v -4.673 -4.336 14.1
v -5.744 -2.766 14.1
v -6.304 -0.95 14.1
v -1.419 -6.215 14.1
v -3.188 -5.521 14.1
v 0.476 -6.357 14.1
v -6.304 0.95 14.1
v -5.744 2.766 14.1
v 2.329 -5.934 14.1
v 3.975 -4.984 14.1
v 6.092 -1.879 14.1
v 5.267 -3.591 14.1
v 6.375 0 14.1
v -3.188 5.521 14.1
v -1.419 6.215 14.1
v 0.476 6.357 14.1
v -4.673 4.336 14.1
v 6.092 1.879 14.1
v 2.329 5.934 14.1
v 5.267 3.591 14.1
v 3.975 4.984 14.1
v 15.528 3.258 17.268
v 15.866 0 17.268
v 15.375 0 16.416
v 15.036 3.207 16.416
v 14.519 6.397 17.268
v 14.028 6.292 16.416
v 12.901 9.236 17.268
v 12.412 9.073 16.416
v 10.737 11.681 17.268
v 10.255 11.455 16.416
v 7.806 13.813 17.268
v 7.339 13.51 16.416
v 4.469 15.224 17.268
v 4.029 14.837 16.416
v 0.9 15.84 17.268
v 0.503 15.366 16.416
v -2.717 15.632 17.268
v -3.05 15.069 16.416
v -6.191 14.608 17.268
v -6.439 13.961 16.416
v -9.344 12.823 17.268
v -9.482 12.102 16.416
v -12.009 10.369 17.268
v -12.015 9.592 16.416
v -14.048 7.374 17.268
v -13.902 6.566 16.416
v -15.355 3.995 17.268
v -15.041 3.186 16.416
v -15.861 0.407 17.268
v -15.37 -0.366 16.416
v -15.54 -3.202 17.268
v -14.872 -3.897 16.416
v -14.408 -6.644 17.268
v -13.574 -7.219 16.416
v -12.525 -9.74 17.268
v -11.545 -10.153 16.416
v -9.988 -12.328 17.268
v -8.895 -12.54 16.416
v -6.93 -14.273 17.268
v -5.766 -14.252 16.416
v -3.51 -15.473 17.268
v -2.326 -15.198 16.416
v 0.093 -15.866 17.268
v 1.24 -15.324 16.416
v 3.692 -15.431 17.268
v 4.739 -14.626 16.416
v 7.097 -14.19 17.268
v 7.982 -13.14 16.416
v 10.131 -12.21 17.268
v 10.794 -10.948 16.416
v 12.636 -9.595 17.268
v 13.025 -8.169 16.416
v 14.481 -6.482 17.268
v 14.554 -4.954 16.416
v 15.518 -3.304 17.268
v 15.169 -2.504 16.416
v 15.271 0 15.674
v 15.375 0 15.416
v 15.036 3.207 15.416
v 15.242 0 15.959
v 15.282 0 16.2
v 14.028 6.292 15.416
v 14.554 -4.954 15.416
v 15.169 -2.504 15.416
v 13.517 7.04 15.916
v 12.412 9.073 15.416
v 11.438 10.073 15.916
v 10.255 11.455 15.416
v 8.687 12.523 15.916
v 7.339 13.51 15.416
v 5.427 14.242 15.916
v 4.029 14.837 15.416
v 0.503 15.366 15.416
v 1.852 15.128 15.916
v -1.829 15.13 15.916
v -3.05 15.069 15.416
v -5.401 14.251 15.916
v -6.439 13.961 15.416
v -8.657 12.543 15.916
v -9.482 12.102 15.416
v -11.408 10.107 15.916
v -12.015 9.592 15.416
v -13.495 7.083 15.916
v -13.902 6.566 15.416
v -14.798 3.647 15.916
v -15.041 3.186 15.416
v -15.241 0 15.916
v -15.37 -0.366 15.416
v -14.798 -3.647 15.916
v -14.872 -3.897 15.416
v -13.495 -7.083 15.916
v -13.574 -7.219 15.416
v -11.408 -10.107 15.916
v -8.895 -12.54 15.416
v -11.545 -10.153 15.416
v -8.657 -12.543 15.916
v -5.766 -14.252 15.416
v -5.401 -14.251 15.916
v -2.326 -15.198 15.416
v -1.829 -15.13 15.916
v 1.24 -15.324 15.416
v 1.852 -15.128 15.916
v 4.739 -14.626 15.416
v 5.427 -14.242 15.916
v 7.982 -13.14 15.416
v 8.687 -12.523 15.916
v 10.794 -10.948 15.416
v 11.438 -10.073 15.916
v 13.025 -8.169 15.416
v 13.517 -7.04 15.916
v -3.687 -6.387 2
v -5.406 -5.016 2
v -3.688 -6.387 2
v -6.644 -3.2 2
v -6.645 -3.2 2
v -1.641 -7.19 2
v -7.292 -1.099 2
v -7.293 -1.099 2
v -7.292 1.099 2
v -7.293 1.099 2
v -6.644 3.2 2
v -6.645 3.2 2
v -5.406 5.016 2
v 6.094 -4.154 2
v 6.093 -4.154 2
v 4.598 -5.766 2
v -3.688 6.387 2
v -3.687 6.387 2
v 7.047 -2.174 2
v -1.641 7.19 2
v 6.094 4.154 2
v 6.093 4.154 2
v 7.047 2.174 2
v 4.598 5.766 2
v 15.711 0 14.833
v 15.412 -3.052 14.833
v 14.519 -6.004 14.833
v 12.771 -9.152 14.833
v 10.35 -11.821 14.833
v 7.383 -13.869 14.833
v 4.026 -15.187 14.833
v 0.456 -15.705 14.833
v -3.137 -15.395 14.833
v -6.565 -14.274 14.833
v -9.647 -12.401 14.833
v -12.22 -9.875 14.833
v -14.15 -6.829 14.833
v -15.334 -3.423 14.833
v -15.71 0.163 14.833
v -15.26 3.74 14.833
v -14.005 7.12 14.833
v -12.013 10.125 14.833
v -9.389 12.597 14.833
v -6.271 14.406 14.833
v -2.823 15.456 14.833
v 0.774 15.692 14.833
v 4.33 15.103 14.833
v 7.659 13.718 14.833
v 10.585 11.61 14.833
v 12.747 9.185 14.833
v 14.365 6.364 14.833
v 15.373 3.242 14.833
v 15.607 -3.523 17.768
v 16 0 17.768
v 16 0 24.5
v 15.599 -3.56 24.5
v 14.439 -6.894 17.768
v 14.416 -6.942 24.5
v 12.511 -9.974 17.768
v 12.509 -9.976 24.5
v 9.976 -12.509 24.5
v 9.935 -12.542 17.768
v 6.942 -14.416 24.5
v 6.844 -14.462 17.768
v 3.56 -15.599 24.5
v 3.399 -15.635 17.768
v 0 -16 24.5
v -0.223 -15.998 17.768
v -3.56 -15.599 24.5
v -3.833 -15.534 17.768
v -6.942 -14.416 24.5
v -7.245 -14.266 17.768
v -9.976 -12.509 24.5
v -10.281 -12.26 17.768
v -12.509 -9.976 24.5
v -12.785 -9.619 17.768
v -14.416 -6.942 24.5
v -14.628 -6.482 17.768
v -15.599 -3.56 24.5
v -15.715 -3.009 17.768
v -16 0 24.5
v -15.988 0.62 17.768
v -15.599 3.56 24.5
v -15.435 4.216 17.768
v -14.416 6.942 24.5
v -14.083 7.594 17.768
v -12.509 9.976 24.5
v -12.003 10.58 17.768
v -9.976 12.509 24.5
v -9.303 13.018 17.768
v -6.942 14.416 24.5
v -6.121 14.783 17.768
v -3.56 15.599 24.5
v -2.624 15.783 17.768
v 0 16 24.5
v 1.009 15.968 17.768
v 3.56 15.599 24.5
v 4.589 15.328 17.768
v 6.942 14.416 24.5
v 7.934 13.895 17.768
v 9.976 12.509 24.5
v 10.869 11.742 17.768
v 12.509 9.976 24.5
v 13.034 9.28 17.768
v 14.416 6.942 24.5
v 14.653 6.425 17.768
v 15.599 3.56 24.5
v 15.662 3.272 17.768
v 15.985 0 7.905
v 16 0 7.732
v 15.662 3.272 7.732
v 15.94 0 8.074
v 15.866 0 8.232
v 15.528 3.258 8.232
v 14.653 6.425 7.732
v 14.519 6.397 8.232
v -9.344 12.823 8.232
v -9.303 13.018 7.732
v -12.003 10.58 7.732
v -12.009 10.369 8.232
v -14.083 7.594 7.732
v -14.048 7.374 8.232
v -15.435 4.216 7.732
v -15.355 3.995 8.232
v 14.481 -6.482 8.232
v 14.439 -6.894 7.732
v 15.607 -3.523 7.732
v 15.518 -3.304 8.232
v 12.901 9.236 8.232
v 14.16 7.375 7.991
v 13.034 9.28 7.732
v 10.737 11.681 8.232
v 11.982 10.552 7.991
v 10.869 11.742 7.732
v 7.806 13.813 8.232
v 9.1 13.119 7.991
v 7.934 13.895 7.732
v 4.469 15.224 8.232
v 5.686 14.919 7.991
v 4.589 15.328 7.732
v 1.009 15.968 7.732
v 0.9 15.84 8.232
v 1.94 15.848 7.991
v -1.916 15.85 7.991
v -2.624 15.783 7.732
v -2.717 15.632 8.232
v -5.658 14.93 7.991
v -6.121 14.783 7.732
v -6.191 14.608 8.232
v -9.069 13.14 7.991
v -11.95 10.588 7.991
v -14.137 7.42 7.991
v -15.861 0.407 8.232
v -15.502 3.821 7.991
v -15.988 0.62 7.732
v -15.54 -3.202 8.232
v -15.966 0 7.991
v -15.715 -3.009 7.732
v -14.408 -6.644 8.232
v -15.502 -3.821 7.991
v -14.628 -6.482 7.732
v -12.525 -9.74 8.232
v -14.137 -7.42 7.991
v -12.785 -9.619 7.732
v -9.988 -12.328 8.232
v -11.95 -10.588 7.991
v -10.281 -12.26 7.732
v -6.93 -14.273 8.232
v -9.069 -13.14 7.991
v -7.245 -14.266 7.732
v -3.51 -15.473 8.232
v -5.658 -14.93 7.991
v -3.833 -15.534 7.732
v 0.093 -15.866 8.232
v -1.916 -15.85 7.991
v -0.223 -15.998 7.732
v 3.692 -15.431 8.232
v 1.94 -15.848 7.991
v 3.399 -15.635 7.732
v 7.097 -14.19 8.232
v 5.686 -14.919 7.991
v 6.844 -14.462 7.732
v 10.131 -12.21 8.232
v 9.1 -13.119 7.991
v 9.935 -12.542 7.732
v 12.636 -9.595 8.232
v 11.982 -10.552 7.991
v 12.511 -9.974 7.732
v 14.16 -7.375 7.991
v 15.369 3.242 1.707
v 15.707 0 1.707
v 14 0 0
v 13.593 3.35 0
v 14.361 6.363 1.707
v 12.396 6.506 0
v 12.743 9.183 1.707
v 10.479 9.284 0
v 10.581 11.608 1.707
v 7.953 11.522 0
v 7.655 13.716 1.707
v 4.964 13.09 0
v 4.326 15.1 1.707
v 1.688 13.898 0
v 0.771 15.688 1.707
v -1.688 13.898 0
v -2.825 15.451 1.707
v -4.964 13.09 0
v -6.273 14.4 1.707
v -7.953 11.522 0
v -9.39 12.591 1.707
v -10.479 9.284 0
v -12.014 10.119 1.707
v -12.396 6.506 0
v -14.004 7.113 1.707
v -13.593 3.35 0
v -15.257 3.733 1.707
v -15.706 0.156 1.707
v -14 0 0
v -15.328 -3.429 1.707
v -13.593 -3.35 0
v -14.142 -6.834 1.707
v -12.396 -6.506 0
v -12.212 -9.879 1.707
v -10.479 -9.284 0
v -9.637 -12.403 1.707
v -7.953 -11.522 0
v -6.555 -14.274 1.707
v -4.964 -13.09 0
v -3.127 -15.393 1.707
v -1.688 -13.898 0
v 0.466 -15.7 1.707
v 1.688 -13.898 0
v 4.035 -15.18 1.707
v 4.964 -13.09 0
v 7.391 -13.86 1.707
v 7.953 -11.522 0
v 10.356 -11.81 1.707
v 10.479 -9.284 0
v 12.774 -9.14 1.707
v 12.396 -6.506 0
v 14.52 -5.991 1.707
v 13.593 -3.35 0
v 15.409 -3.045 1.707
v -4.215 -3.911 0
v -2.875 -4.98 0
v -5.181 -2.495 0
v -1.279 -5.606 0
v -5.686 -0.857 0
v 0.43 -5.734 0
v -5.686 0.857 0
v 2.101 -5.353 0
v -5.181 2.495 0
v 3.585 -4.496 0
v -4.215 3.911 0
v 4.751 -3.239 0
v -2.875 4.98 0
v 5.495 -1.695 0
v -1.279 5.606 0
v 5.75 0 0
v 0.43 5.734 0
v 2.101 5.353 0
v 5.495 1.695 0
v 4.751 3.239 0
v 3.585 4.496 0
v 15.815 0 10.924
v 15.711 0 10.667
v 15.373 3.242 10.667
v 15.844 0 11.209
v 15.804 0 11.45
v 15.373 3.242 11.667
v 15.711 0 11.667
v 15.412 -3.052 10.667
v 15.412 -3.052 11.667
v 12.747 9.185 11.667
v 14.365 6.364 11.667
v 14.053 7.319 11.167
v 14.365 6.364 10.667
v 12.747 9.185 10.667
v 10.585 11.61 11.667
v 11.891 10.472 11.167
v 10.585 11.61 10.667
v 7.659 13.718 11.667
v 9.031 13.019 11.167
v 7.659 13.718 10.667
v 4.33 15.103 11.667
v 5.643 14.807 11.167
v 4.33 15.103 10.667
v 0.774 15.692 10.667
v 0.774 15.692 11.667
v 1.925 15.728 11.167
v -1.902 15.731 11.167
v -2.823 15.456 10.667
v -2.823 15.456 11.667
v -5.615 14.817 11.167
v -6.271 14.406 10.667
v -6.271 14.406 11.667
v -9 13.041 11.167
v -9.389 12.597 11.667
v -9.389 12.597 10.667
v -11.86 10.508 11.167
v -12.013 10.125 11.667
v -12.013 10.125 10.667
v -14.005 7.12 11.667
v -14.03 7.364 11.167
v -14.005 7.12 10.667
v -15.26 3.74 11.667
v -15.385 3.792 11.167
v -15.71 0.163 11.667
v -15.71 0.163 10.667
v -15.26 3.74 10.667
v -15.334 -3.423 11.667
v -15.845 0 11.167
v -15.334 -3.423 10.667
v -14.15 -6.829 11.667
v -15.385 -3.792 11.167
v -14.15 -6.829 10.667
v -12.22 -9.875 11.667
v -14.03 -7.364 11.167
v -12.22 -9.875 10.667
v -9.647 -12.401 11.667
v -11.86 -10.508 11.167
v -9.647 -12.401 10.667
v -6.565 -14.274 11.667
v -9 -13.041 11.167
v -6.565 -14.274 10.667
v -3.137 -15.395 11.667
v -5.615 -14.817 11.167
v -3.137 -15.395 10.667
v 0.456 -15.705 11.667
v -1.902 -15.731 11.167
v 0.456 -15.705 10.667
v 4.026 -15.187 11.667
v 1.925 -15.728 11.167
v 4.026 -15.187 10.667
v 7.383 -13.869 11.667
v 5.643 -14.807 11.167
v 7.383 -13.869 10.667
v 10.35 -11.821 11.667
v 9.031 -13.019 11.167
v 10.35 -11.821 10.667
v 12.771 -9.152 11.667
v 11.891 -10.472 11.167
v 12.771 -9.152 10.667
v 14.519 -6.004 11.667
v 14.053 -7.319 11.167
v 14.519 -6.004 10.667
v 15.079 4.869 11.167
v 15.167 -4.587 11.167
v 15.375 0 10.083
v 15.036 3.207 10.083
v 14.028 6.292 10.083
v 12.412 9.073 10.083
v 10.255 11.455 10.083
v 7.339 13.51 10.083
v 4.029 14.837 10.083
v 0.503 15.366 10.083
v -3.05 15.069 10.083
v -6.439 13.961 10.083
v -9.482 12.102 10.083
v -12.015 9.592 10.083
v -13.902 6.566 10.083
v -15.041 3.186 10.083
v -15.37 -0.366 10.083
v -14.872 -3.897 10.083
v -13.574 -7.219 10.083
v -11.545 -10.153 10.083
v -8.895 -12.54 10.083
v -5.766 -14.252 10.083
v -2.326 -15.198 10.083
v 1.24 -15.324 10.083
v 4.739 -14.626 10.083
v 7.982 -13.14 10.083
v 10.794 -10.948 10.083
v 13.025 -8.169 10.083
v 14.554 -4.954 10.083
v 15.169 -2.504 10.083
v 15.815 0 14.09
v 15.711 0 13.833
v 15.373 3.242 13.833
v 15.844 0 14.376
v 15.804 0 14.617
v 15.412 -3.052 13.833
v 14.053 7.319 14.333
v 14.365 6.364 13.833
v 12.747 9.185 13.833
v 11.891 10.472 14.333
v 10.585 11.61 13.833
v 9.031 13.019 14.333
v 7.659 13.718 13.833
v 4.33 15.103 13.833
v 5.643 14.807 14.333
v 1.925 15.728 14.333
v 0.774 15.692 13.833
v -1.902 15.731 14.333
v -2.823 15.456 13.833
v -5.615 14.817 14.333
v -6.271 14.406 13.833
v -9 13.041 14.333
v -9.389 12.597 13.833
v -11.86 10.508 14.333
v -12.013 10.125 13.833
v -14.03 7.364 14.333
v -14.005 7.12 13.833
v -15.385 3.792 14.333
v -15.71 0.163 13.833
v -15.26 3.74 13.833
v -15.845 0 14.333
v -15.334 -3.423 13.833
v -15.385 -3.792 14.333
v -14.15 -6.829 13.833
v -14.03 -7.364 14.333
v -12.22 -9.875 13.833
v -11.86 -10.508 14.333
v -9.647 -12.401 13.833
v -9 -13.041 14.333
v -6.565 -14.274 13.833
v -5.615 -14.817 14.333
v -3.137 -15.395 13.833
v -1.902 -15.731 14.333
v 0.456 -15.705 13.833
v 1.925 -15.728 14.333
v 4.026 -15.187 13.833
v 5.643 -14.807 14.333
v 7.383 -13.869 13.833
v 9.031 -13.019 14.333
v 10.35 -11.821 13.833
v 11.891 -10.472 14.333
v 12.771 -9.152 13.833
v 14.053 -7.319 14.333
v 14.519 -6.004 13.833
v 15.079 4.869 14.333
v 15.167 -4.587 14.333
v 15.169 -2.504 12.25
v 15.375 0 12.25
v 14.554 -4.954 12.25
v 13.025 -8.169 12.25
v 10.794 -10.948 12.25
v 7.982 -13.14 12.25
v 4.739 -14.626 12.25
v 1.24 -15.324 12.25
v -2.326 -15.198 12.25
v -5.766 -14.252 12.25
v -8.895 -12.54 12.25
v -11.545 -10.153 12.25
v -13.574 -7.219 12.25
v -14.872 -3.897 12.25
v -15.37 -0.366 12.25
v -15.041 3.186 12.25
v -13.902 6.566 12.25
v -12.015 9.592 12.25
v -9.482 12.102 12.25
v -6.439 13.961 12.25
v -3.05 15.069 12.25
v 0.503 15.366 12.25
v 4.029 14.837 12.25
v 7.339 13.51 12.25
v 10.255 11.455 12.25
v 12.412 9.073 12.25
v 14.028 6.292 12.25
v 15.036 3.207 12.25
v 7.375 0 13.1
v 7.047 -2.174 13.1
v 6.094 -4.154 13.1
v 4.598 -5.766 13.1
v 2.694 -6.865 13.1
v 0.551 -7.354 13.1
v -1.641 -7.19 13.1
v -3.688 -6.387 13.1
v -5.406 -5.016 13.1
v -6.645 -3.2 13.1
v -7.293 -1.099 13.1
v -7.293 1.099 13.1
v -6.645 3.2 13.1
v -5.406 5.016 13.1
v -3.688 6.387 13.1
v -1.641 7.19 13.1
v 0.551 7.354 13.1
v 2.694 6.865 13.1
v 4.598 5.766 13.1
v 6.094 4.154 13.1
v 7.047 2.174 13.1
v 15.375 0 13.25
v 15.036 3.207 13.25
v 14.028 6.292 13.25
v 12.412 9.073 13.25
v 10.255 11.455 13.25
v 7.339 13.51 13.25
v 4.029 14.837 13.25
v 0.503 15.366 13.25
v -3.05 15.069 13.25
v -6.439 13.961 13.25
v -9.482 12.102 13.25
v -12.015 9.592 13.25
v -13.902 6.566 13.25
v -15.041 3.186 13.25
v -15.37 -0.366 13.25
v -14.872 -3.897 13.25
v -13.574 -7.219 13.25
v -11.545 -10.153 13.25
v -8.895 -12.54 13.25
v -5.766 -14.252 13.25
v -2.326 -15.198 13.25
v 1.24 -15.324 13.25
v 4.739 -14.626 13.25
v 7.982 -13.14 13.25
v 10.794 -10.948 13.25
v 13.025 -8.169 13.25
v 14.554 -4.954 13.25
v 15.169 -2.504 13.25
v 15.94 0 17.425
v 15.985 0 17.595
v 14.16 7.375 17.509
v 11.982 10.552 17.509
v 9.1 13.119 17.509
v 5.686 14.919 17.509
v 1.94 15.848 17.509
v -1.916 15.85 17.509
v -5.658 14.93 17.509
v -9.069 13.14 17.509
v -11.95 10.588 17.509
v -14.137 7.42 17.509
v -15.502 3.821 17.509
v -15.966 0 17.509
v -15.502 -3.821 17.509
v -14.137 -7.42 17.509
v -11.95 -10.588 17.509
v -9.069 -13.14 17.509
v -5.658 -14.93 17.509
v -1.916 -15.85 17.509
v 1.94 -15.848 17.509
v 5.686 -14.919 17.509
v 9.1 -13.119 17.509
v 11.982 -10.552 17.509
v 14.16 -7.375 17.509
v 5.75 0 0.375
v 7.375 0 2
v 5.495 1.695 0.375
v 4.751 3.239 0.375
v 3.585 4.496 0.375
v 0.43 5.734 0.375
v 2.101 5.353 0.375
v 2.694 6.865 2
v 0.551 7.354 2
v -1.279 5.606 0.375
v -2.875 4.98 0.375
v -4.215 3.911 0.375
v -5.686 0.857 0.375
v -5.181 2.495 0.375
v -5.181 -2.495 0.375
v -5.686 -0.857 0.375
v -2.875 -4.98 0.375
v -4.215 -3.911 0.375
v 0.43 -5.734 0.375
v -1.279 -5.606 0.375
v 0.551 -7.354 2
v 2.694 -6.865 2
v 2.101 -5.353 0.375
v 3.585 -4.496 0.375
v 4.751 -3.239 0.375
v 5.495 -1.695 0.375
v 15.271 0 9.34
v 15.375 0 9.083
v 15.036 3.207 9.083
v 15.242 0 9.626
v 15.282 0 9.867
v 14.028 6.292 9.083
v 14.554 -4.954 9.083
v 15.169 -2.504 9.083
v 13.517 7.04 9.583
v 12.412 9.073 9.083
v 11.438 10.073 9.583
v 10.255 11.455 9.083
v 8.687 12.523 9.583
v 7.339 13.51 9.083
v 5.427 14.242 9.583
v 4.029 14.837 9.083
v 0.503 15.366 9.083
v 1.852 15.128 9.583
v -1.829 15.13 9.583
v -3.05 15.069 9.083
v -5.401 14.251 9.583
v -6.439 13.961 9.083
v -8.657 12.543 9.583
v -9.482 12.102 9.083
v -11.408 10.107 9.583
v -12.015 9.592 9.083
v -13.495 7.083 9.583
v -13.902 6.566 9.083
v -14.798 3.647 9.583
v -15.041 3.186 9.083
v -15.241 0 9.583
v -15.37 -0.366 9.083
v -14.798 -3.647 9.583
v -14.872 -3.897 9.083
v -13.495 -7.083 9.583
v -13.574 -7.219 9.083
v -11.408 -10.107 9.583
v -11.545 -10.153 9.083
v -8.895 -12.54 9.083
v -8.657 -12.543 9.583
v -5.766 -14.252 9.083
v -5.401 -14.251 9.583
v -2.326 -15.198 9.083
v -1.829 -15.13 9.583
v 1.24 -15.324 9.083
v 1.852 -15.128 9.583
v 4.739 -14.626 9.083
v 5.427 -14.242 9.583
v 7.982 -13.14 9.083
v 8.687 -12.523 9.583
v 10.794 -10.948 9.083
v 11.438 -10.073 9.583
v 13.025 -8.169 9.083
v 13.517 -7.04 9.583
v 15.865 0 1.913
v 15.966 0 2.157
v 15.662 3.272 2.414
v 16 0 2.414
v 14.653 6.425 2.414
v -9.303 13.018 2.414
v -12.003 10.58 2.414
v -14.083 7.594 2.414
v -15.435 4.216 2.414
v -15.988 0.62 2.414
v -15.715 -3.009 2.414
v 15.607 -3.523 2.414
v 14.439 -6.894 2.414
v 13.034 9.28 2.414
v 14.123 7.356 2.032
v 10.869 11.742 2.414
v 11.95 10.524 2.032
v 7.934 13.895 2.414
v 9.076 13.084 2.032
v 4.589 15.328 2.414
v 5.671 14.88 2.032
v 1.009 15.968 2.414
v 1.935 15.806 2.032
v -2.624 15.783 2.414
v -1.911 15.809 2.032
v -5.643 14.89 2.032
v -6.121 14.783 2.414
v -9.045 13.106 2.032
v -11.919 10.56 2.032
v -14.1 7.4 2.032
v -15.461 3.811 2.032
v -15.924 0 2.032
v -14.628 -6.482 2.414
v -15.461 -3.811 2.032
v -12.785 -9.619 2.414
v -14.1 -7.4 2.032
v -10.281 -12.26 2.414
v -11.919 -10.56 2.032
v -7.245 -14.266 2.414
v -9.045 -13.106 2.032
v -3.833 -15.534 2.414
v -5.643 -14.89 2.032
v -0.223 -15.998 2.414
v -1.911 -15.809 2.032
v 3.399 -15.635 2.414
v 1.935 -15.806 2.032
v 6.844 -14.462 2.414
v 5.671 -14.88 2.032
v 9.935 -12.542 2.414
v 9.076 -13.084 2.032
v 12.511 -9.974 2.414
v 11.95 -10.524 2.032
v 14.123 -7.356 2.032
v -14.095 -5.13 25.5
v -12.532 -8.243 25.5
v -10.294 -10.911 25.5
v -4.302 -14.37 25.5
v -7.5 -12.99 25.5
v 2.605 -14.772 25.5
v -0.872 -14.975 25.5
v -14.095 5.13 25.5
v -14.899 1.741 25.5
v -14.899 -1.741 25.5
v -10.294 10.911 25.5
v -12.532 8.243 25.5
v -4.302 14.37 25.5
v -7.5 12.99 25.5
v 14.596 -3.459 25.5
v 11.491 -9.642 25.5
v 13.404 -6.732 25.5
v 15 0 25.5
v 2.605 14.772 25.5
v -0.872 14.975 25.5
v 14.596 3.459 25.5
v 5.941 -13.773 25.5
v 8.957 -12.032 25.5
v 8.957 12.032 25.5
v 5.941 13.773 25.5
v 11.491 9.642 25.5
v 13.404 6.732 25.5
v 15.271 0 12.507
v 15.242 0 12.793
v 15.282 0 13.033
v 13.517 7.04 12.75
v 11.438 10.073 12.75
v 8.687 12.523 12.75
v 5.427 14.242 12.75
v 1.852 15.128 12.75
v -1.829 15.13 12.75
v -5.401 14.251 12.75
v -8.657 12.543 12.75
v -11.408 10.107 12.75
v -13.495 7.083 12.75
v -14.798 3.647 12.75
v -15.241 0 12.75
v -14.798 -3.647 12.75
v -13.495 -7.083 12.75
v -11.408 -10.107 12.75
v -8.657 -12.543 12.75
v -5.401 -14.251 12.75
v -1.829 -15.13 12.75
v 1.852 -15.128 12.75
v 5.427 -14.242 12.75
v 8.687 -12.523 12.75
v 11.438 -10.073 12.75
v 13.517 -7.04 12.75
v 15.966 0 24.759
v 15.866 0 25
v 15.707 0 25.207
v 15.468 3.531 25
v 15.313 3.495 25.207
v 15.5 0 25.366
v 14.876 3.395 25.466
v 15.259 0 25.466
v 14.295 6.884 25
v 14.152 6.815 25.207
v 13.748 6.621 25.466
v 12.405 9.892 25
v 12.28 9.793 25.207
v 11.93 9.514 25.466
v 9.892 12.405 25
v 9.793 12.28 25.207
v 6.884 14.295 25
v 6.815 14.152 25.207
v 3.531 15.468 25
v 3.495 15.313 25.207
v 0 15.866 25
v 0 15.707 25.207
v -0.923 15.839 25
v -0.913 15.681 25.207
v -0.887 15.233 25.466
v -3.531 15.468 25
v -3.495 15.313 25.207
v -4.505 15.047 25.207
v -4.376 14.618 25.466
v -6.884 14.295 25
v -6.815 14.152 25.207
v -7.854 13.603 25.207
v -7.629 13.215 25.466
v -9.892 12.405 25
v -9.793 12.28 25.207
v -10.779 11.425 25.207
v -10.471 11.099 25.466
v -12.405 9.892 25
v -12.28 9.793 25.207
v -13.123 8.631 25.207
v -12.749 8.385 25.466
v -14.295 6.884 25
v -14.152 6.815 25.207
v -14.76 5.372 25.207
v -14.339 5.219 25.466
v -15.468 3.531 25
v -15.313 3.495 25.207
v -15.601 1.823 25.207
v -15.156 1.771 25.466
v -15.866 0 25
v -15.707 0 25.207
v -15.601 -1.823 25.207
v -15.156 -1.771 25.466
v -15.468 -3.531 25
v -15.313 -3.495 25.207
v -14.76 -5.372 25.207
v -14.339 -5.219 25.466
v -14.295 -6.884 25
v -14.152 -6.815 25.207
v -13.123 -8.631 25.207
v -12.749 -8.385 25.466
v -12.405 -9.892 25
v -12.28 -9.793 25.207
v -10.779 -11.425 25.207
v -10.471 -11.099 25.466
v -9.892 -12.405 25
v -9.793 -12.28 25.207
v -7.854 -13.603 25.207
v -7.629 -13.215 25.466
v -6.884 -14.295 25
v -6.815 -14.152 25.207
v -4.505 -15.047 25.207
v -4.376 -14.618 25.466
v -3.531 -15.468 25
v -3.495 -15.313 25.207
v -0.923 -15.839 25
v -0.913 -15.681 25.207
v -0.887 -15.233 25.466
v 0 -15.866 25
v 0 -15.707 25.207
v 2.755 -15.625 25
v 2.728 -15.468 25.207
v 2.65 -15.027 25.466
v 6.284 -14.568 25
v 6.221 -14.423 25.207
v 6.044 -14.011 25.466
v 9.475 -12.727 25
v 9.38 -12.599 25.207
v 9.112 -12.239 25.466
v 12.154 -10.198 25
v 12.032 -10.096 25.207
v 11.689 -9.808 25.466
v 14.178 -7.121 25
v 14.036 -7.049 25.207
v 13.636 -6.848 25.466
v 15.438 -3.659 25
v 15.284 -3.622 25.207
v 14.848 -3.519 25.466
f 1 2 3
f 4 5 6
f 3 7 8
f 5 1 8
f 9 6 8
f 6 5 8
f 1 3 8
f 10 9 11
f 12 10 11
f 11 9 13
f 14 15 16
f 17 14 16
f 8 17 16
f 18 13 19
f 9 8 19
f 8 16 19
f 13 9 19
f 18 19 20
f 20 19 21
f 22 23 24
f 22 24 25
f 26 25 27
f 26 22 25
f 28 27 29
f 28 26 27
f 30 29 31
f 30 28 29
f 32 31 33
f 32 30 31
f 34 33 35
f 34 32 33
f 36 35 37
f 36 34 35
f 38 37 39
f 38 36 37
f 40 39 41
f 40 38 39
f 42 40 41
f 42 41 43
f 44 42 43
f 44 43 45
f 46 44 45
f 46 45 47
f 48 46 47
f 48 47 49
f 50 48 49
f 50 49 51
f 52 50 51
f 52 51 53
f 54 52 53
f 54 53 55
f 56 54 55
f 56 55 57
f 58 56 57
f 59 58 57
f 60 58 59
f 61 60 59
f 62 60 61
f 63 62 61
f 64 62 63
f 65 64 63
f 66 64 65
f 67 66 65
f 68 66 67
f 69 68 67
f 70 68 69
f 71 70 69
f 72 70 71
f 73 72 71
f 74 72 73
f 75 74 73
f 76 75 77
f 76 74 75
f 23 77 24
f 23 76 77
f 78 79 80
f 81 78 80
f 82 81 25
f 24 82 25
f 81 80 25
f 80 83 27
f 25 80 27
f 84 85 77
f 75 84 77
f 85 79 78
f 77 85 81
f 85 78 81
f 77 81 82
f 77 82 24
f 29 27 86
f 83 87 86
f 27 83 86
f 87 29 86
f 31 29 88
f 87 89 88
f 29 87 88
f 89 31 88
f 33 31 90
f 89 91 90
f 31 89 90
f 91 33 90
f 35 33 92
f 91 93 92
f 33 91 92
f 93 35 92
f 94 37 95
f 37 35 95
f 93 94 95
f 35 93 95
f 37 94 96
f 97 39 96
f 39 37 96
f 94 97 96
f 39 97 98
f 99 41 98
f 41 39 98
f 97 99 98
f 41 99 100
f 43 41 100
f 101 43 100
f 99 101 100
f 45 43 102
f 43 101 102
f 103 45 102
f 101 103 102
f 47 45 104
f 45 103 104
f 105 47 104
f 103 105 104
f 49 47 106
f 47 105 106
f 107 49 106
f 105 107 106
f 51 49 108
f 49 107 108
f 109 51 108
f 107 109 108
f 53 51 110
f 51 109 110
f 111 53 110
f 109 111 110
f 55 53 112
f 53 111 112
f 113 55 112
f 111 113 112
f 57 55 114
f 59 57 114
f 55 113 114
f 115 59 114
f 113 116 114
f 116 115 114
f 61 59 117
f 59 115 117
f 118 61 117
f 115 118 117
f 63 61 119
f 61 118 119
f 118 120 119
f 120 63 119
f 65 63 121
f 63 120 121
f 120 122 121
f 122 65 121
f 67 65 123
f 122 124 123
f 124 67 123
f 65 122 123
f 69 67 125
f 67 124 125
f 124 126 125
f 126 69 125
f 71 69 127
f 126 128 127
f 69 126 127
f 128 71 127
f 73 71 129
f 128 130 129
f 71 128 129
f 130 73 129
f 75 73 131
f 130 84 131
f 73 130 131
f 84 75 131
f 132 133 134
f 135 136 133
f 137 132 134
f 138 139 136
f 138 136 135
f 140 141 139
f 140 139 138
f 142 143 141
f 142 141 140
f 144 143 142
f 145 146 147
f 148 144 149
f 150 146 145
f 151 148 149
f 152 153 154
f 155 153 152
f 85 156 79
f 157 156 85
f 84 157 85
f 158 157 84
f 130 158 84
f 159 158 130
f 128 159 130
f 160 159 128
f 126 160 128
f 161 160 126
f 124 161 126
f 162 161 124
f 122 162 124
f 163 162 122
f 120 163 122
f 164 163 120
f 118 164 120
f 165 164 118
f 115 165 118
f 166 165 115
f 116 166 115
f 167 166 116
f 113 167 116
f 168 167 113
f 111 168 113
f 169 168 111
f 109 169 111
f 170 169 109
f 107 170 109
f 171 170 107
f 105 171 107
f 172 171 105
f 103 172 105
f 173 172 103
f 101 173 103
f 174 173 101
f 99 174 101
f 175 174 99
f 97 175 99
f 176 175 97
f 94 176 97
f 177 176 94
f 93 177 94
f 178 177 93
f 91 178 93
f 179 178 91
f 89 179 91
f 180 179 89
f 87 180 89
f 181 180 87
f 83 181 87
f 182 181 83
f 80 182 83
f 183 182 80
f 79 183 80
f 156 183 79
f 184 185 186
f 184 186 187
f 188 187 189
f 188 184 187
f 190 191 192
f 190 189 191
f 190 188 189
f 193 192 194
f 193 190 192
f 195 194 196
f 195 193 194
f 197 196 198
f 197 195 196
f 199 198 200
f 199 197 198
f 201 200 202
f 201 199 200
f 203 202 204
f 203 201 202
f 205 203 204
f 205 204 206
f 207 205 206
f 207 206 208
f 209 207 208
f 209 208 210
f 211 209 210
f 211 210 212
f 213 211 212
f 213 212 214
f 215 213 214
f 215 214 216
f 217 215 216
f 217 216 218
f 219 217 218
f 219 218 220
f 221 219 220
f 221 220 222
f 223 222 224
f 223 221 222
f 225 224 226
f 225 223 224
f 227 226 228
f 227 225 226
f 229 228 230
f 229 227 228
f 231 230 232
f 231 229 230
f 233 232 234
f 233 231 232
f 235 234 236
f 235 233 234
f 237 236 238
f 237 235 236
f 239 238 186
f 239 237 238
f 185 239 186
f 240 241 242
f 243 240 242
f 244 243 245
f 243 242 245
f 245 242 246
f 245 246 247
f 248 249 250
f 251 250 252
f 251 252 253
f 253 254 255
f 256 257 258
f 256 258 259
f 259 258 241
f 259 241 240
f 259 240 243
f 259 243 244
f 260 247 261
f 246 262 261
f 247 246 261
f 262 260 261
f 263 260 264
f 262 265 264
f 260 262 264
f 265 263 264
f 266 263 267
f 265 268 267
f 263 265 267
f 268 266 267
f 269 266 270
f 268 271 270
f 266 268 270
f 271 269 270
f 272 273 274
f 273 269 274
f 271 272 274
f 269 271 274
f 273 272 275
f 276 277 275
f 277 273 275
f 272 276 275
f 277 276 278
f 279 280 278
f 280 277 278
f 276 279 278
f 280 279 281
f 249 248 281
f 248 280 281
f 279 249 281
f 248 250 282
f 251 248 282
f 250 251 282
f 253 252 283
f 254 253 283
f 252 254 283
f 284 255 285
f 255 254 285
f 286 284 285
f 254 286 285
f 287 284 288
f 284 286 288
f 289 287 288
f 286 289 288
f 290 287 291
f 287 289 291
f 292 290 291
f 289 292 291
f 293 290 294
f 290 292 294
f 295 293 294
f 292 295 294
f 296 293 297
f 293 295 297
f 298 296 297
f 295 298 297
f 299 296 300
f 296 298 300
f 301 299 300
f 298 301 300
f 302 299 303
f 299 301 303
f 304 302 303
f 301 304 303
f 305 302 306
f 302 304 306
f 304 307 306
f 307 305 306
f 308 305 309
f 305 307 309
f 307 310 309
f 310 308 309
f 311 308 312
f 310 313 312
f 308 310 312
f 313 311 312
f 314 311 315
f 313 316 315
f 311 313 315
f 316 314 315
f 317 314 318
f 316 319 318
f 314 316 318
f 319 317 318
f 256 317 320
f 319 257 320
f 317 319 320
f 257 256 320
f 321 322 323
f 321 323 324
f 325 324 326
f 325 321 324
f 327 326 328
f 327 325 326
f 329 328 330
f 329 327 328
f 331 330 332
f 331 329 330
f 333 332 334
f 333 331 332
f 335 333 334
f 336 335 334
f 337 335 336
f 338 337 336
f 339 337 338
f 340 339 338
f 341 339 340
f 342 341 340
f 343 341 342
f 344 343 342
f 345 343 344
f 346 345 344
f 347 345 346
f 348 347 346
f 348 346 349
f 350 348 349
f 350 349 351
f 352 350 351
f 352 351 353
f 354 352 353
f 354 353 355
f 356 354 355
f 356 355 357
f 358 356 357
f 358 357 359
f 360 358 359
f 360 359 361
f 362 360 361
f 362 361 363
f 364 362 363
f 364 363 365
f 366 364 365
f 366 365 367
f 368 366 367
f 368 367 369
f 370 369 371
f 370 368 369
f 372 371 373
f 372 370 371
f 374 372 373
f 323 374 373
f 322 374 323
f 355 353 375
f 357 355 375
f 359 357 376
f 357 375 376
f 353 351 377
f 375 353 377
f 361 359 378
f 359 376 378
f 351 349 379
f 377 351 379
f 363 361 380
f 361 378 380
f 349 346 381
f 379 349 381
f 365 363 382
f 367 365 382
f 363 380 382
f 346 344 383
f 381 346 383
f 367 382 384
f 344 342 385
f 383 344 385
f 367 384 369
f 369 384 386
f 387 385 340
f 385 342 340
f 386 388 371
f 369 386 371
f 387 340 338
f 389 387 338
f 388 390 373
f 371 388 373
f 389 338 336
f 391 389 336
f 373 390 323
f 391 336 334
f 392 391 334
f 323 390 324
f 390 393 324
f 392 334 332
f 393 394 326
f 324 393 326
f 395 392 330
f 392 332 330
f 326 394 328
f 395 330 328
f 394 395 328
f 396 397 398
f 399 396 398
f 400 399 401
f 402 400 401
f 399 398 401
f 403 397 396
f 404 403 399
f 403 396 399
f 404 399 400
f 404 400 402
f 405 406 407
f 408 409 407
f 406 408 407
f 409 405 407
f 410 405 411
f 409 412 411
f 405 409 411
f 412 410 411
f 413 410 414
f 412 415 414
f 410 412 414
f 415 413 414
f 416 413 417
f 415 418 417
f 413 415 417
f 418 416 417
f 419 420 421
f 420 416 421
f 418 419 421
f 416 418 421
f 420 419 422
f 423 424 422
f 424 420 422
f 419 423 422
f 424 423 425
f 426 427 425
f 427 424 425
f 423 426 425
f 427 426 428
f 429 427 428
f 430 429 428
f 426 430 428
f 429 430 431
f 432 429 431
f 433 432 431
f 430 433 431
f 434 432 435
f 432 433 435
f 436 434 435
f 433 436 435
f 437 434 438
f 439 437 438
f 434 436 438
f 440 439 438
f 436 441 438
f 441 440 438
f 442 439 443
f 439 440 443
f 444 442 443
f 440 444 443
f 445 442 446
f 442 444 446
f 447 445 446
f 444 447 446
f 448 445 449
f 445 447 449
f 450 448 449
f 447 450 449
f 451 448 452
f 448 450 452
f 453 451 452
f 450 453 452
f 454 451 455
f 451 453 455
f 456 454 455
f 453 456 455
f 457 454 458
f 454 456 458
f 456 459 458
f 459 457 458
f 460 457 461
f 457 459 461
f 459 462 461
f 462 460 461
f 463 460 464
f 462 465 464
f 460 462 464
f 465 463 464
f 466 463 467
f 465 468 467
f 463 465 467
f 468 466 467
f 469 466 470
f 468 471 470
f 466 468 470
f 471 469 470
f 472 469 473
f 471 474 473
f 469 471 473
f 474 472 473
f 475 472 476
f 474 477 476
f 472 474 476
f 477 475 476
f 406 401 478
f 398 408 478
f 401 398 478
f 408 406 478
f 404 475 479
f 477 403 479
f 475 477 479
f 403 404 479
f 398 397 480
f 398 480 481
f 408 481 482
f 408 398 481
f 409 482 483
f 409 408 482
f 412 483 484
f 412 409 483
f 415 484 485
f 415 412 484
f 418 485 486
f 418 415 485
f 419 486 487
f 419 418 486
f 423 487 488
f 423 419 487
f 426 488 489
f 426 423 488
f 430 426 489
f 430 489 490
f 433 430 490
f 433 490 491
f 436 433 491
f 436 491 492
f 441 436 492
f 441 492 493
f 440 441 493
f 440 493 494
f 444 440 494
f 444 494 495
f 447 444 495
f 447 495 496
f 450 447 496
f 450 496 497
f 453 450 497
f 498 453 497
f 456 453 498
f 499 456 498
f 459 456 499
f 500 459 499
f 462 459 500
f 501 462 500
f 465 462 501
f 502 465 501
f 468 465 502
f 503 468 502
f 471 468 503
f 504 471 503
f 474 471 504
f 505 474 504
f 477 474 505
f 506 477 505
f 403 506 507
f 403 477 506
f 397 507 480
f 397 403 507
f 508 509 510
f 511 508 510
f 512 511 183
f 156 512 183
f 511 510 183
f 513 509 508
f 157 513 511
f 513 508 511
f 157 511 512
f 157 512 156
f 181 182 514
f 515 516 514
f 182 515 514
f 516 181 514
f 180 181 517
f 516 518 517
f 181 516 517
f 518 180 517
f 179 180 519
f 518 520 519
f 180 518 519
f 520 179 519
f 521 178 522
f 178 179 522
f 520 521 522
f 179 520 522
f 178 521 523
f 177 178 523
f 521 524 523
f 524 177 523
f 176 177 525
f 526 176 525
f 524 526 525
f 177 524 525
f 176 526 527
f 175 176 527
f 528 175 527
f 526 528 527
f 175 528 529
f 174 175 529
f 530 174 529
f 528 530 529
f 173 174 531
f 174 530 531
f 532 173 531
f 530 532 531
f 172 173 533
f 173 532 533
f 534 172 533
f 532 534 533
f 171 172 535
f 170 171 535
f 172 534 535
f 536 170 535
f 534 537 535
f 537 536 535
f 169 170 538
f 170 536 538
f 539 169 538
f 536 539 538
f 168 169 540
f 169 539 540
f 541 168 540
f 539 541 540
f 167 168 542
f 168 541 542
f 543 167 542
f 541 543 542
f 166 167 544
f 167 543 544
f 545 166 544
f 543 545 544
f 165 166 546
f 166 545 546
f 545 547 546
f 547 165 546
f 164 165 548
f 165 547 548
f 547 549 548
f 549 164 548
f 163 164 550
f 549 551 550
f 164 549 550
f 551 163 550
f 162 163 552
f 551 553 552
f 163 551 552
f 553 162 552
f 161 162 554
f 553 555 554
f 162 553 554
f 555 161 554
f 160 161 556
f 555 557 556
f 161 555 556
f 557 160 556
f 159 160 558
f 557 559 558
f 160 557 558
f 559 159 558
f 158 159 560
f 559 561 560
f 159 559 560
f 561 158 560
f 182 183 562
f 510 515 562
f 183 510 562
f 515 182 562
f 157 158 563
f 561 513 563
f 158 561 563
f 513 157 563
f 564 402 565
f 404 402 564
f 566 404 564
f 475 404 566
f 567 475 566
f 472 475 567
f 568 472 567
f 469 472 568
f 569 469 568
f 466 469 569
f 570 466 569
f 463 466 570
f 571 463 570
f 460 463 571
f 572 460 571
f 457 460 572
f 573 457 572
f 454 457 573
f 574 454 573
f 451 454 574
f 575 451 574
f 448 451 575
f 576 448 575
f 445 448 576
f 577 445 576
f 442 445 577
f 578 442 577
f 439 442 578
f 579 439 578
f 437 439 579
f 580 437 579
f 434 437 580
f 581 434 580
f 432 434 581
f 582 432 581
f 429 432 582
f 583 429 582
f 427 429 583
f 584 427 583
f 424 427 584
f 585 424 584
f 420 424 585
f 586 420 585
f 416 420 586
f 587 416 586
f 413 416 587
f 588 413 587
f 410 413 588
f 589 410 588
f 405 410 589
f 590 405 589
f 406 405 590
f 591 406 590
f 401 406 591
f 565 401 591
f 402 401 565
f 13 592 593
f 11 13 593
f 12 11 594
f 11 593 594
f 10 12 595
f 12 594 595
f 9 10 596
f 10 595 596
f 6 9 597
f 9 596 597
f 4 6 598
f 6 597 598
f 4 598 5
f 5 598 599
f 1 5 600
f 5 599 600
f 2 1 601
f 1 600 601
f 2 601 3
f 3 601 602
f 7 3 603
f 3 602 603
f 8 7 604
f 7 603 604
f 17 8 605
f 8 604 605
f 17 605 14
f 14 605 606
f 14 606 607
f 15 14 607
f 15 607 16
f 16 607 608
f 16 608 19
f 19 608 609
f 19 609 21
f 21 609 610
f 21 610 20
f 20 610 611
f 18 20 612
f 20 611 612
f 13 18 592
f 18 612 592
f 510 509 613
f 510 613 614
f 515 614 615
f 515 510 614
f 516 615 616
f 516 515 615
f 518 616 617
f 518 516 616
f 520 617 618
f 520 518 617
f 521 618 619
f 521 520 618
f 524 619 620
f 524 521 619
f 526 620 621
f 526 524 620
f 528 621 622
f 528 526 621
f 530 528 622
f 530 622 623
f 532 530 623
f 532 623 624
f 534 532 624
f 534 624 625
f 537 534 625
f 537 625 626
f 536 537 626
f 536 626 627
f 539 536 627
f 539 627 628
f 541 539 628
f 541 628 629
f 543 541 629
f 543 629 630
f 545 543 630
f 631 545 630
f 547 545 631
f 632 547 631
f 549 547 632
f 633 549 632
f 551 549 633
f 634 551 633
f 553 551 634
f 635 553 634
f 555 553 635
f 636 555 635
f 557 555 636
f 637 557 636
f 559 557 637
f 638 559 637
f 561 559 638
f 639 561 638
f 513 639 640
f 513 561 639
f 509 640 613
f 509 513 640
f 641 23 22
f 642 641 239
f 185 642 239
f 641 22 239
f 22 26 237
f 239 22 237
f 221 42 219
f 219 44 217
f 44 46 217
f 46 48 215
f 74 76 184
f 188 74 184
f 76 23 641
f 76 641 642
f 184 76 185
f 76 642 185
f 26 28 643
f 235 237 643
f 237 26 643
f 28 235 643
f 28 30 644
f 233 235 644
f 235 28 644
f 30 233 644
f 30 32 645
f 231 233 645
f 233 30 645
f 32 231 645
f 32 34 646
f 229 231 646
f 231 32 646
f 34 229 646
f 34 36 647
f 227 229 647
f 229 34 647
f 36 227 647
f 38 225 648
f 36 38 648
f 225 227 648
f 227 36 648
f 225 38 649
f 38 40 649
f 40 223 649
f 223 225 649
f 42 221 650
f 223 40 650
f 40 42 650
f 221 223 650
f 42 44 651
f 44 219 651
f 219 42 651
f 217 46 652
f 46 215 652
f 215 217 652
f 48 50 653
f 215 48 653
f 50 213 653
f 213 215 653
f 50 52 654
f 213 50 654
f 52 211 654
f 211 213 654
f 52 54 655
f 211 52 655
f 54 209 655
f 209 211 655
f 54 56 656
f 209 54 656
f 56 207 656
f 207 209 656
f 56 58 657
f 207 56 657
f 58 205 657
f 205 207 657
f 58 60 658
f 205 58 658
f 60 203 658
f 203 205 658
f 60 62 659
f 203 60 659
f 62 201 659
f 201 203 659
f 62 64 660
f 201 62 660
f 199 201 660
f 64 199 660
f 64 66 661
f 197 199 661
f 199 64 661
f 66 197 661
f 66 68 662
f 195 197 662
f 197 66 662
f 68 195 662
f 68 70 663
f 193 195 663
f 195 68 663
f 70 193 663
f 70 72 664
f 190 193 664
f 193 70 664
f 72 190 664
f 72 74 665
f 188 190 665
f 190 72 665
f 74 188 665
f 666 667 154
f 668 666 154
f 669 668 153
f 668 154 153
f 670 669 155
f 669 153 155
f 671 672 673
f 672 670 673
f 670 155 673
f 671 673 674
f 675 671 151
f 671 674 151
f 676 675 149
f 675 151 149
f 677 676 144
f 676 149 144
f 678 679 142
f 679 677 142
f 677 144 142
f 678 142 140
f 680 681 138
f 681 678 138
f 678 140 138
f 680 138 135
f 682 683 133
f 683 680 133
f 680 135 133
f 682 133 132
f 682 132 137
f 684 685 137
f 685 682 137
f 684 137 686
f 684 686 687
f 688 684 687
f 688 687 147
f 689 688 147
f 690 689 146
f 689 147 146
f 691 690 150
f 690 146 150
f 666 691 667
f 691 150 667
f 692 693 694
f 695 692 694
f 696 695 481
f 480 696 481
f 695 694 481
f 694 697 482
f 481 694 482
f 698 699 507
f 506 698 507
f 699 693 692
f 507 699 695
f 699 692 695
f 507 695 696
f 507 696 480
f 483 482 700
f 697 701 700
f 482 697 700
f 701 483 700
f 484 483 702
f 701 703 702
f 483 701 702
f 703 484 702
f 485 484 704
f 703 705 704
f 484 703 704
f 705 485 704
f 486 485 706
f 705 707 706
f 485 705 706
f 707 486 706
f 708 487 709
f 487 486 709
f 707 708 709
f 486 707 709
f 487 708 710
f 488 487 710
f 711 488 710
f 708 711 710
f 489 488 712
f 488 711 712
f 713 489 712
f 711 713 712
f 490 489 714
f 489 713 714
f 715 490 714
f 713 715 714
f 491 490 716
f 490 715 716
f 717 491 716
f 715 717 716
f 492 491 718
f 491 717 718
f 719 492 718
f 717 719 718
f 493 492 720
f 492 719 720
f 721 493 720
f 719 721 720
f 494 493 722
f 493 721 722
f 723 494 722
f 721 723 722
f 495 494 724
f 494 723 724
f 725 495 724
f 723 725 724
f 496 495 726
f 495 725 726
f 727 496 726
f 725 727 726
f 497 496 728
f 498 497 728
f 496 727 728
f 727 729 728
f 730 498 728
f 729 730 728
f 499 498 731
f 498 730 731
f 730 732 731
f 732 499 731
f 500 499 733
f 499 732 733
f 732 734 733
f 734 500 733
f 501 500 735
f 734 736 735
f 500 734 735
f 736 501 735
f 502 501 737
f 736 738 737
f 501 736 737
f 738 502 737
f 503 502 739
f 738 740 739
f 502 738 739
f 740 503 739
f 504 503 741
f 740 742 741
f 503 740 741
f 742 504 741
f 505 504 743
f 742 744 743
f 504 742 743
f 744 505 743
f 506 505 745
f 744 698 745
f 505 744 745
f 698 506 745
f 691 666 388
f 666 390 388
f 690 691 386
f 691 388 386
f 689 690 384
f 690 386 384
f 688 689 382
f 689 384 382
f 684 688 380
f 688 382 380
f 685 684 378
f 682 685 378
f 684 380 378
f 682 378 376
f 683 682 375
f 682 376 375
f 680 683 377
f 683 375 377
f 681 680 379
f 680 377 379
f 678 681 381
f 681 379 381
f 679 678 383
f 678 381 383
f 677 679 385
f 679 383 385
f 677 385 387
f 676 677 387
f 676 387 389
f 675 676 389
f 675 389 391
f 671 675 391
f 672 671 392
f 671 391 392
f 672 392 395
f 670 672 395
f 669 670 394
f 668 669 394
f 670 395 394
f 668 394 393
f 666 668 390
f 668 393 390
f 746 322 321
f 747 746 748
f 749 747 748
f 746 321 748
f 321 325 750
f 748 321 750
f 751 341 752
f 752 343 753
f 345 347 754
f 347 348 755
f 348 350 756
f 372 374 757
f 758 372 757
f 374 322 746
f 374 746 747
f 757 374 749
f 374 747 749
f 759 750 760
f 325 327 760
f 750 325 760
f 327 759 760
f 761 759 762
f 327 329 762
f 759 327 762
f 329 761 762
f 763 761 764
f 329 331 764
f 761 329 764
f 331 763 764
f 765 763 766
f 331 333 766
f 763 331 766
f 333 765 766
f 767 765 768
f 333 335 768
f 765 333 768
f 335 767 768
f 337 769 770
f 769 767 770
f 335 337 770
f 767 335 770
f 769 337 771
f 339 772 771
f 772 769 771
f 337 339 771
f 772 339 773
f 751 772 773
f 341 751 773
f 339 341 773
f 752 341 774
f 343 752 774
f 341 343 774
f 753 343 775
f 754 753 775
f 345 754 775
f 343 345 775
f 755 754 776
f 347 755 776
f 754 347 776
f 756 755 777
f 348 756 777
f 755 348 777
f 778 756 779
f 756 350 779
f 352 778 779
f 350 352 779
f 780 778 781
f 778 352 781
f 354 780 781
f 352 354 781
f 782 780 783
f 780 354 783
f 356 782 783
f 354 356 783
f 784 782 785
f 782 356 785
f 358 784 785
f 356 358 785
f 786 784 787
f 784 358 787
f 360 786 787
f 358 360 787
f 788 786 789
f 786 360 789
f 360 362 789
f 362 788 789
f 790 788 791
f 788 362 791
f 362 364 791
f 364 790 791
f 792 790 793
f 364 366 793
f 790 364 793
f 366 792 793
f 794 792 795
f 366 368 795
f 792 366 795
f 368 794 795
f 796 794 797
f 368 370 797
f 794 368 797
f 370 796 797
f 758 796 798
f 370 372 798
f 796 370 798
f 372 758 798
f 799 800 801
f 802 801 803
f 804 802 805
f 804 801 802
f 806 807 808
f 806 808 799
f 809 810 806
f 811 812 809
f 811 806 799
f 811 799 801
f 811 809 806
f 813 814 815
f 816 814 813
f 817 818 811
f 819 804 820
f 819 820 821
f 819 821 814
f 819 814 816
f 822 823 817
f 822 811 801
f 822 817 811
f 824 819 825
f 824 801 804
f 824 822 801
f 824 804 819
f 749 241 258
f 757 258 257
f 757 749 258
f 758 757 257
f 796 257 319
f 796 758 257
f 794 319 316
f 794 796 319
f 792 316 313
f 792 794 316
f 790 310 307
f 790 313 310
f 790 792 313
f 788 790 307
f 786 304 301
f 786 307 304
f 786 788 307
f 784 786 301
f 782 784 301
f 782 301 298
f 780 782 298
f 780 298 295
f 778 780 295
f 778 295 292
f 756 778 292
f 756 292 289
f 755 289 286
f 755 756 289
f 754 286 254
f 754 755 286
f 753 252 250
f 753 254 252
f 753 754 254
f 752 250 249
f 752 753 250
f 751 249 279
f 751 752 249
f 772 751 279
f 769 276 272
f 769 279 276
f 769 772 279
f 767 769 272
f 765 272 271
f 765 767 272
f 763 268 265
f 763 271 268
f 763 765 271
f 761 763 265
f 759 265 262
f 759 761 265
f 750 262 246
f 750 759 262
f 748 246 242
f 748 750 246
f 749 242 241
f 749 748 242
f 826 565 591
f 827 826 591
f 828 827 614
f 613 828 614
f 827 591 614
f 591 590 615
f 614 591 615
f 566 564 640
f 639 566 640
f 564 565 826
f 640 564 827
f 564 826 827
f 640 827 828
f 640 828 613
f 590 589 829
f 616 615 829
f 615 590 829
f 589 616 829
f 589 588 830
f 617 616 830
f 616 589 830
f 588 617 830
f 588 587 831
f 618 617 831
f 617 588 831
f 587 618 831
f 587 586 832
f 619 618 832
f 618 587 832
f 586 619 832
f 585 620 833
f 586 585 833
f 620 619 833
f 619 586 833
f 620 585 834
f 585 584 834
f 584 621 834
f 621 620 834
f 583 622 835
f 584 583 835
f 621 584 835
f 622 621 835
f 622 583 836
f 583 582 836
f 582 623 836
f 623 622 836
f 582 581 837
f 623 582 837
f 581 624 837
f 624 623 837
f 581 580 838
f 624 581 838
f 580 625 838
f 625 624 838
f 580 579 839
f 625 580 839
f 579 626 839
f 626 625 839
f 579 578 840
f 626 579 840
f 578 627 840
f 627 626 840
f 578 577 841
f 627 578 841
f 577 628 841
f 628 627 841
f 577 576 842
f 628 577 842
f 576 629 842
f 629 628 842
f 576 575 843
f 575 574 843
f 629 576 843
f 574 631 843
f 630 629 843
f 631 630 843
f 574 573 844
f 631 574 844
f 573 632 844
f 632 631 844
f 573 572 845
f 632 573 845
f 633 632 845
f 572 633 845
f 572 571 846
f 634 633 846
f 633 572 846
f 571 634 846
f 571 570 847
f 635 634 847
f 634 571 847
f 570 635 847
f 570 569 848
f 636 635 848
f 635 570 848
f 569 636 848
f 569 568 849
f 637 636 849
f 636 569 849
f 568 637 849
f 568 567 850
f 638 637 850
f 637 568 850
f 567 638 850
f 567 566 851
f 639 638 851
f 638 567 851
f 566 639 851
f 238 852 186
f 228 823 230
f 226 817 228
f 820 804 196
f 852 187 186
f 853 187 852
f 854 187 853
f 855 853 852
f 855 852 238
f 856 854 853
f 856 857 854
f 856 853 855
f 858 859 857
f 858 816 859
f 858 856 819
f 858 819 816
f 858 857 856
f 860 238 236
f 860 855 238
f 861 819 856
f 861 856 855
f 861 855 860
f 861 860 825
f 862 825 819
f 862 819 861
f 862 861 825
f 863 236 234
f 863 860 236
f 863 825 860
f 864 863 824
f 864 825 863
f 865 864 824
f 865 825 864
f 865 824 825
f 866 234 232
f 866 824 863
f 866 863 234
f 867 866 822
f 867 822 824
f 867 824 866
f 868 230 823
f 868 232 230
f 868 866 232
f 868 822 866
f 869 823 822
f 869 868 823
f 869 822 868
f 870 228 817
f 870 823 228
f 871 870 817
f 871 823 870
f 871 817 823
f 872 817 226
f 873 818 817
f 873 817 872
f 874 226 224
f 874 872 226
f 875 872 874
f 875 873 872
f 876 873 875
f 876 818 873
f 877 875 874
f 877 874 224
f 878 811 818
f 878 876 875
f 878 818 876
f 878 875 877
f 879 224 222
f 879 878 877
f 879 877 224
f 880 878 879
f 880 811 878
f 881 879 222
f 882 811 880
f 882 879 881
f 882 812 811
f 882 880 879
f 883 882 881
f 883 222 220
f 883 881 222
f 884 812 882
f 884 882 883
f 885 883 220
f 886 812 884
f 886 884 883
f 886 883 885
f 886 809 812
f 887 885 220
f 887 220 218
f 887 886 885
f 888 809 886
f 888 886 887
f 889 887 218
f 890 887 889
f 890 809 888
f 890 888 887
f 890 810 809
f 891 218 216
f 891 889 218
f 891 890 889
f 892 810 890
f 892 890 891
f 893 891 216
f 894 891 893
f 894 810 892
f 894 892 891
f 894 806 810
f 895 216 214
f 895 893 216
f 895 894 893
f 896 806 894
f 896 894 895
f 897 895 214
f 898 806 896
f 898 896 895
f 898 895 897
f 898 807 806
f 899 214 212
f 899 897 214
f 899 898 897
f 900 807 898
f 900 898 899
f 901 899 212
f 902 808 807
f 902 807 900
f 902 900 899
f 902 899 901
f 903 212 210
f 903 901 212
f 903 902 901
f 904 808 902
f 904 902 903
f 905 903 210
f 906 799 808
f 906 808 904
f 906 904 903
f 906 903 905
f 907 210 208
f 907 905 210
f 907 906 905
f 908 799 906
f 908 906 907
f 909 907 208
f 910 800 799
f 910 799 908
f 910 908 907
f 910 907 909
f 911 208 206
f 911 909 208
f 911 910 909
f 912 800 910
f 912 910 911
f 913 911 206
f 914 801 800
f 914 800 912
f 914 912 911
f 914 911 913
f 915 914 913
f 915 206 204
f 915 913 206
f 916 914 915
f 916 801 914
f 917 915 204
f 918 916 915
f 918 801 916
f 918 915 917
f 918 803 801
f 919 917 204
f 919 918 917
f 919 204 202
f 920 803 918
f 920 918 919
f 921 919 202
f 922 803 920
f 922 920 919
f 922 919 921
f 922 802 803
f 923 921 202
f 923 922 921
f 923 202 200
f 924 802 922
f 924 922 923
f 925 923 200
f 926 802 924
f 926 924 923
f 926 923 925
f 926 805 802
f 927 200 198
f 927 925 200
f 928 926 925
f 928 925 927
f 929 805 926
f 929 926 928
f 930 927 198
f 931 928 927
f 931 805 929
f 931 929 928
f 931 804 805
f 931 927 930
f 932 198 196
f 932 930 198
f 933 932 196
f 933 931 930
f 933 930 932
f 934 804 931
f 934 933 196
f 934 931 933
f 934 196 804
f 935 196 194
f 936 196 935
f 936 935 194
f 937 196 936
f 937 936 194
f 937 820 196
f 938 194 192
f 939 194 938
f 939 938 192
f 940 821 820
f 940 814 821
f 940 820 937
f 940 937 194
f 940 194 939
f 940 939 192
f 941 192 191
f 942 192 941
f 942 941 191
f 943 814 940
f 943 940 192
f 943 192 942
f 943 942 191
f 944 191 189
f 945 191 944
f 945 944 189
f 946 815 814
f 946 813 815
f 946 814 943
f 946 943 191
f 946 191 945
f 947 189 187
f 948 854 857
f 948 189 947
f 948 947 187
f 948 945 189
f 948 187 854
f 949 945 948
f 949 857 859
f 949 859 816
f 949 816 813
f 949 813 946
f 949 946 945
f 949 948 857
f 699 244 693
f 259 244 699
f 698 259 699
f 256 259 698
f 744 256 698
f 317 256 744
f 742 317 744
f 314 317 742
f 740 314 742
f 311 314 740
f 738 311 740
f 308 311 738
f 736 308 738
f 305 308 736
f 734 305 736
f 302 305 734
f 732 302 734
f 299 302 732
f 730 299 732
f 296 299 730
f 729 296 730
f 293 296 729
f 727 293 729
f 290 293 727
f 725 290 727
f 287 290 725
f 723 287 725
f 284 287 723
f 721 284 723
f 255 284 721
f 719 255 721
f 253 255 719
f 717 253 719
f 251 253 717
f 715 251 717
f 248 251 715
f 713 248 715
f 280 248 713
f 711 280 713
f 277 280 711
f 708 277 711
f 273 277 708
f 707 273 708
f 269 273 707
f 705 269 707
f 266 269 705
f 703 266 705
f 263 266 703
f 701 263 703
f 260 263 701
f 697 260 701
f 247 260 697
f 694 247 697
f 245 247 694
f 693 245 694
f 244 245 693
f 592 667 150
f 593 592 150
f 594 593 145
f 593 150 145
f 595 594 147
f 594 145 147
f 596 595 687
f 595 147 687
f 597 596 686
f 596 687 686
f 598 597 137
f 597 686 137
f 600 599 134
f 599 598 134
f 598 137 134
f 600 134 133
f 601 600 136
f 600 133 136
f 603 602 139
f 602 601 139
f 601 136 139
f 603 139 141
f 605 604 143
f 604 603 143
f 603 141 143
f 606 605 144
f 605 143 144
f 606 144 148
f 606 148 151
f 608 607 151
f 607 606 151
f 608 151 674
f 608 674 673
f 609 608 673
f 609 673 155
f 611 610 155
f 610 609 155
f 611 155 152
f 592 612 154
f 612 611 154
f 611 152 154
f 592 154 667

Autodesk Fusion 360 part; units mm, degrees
sketch "Sketch1" plane through (0, 0, 0) normal (0, 0, 1) x (1, 0, 0)
  circle A0 centre (0, 0) radius 16
  circle A1 centre (0, 0) radius 5.75
  circle A2 centre (0, 0) radius 7.375
  dimension "d7" = 32
  dimension "d8" = 11.5
  dimension "d9" = 14.75
extrude "Extrude1" add sketch "Sketch1" along normal blind 8 contours A0 | A1 | A2
extrude "Extrude2" add 1 faces at (3.3126, -0.5422, 8) along direction (0, 0, 1) blind 1.5833 draft -30
extrude "Extrude3" add 1 faces at (4.1548, -2.8327, 9.5833) along direction (0, 0, 1) blind 1.5833 draft 30
extrude "Extrude4" add 1 faces at (3.3126, -0.5422, 11.1667) along direction (0, 0, 1) blind 1.5833 draft -30
extrude "Extrude5" add 1 faces at (4.1548, -2.8327, 12.75) along direction (0, 0, 1) blind 1.5833 draft 30
extrude "Extrude6" add 1 faces at (-4.6978, -3.7464, 14.3333) along direction (0, 0, 1) blind 1.5833 draft -30
extrude "Extrude7" add 1 faces at (-7.4207, -2.8415, 15.9167) along direction (0, 0, 1) blind 1.5833 draft 30
extrude "Extrude8" add 1 faces at (-4.6978, -3.7464, 17.5) along direction (0, 0, 1) blind 8
extrude "Extrude9" cut sketch "Sketch1" along normal blind 14.1 contours A1
extrude "Extrude10" cut sketch "Sketch1" along normal blind 12.1 from surface at 2 contours A1 | A2
chamfer "Chamfer1" distance 1.625 angle 45 1 edges at (-5.3609, -2.0793, 2)
chamfer "Chamfer2" distance 1 angle 45 1 edges at (-6.8759, -2.6669, 14.1)
chamfer "Chamfer2" distance 2 angle 45 1 edges at (-14.9172, -5.7858, 0)
fillet "Fillet1" radius 1 9 edges at (-14.9172, 5.7858, 14.3333) (-14.9172, 5.7858, 11.1667) (-14.065, 5.4553, 12.75) (-14.065, 5.4553, 15.9167) (-14.9172, 5.7858, 17.5) (-14.065, 5.4553, 9.5833) (-14.9172, -5.7858, 8) (-14.9172, 5.7858, 2) (-14.9172, -5.7858, 25.5)
equation "id = 11.5 mm"
equation "od = 32 mm"
equation "notchwidth = 14.75 mm"
equation "pegDepth = 10.1 mm"
equation "ridgeStart = 8 mm"
equation "ridgeHeight = 9.5 mm"
equation "d7 = od"
equation "d8 = id"
equation "d9 = notchwidth"
equation "d10 = ridgeStart"
equation "d12 = ridgeHeight / 6"
equation "d13 = -ridgeAngle"
equation "d14 = ridgeHeight / ridgeCount"
equation "d15 = ridgeAngle"
equation "ridgeCount = 6"
equation "ridgeAngle = 30 deg"
equation "d18 = ridgeHeight / ridgeCount"
equation "d19 = -ridgeAngle"
equation "d20 = ridgeHeight / ridgeCount"
equation "d21 = ridgeAngle"
equation "d22 = ridgeHeight / ridgeCount"
equation "d23 = -ridgeAngle"
equation "d24 = ridgeHeight / ridgeCount"
equation "d25 = ridgeAngle"
equation "d26 = ridgeStart"
equation "d28 = pegDepth + 4 mm"
equation "d31 = pegDepth + 2 mm"
equation "d33 = ( notchwidth - id ) / 2"
